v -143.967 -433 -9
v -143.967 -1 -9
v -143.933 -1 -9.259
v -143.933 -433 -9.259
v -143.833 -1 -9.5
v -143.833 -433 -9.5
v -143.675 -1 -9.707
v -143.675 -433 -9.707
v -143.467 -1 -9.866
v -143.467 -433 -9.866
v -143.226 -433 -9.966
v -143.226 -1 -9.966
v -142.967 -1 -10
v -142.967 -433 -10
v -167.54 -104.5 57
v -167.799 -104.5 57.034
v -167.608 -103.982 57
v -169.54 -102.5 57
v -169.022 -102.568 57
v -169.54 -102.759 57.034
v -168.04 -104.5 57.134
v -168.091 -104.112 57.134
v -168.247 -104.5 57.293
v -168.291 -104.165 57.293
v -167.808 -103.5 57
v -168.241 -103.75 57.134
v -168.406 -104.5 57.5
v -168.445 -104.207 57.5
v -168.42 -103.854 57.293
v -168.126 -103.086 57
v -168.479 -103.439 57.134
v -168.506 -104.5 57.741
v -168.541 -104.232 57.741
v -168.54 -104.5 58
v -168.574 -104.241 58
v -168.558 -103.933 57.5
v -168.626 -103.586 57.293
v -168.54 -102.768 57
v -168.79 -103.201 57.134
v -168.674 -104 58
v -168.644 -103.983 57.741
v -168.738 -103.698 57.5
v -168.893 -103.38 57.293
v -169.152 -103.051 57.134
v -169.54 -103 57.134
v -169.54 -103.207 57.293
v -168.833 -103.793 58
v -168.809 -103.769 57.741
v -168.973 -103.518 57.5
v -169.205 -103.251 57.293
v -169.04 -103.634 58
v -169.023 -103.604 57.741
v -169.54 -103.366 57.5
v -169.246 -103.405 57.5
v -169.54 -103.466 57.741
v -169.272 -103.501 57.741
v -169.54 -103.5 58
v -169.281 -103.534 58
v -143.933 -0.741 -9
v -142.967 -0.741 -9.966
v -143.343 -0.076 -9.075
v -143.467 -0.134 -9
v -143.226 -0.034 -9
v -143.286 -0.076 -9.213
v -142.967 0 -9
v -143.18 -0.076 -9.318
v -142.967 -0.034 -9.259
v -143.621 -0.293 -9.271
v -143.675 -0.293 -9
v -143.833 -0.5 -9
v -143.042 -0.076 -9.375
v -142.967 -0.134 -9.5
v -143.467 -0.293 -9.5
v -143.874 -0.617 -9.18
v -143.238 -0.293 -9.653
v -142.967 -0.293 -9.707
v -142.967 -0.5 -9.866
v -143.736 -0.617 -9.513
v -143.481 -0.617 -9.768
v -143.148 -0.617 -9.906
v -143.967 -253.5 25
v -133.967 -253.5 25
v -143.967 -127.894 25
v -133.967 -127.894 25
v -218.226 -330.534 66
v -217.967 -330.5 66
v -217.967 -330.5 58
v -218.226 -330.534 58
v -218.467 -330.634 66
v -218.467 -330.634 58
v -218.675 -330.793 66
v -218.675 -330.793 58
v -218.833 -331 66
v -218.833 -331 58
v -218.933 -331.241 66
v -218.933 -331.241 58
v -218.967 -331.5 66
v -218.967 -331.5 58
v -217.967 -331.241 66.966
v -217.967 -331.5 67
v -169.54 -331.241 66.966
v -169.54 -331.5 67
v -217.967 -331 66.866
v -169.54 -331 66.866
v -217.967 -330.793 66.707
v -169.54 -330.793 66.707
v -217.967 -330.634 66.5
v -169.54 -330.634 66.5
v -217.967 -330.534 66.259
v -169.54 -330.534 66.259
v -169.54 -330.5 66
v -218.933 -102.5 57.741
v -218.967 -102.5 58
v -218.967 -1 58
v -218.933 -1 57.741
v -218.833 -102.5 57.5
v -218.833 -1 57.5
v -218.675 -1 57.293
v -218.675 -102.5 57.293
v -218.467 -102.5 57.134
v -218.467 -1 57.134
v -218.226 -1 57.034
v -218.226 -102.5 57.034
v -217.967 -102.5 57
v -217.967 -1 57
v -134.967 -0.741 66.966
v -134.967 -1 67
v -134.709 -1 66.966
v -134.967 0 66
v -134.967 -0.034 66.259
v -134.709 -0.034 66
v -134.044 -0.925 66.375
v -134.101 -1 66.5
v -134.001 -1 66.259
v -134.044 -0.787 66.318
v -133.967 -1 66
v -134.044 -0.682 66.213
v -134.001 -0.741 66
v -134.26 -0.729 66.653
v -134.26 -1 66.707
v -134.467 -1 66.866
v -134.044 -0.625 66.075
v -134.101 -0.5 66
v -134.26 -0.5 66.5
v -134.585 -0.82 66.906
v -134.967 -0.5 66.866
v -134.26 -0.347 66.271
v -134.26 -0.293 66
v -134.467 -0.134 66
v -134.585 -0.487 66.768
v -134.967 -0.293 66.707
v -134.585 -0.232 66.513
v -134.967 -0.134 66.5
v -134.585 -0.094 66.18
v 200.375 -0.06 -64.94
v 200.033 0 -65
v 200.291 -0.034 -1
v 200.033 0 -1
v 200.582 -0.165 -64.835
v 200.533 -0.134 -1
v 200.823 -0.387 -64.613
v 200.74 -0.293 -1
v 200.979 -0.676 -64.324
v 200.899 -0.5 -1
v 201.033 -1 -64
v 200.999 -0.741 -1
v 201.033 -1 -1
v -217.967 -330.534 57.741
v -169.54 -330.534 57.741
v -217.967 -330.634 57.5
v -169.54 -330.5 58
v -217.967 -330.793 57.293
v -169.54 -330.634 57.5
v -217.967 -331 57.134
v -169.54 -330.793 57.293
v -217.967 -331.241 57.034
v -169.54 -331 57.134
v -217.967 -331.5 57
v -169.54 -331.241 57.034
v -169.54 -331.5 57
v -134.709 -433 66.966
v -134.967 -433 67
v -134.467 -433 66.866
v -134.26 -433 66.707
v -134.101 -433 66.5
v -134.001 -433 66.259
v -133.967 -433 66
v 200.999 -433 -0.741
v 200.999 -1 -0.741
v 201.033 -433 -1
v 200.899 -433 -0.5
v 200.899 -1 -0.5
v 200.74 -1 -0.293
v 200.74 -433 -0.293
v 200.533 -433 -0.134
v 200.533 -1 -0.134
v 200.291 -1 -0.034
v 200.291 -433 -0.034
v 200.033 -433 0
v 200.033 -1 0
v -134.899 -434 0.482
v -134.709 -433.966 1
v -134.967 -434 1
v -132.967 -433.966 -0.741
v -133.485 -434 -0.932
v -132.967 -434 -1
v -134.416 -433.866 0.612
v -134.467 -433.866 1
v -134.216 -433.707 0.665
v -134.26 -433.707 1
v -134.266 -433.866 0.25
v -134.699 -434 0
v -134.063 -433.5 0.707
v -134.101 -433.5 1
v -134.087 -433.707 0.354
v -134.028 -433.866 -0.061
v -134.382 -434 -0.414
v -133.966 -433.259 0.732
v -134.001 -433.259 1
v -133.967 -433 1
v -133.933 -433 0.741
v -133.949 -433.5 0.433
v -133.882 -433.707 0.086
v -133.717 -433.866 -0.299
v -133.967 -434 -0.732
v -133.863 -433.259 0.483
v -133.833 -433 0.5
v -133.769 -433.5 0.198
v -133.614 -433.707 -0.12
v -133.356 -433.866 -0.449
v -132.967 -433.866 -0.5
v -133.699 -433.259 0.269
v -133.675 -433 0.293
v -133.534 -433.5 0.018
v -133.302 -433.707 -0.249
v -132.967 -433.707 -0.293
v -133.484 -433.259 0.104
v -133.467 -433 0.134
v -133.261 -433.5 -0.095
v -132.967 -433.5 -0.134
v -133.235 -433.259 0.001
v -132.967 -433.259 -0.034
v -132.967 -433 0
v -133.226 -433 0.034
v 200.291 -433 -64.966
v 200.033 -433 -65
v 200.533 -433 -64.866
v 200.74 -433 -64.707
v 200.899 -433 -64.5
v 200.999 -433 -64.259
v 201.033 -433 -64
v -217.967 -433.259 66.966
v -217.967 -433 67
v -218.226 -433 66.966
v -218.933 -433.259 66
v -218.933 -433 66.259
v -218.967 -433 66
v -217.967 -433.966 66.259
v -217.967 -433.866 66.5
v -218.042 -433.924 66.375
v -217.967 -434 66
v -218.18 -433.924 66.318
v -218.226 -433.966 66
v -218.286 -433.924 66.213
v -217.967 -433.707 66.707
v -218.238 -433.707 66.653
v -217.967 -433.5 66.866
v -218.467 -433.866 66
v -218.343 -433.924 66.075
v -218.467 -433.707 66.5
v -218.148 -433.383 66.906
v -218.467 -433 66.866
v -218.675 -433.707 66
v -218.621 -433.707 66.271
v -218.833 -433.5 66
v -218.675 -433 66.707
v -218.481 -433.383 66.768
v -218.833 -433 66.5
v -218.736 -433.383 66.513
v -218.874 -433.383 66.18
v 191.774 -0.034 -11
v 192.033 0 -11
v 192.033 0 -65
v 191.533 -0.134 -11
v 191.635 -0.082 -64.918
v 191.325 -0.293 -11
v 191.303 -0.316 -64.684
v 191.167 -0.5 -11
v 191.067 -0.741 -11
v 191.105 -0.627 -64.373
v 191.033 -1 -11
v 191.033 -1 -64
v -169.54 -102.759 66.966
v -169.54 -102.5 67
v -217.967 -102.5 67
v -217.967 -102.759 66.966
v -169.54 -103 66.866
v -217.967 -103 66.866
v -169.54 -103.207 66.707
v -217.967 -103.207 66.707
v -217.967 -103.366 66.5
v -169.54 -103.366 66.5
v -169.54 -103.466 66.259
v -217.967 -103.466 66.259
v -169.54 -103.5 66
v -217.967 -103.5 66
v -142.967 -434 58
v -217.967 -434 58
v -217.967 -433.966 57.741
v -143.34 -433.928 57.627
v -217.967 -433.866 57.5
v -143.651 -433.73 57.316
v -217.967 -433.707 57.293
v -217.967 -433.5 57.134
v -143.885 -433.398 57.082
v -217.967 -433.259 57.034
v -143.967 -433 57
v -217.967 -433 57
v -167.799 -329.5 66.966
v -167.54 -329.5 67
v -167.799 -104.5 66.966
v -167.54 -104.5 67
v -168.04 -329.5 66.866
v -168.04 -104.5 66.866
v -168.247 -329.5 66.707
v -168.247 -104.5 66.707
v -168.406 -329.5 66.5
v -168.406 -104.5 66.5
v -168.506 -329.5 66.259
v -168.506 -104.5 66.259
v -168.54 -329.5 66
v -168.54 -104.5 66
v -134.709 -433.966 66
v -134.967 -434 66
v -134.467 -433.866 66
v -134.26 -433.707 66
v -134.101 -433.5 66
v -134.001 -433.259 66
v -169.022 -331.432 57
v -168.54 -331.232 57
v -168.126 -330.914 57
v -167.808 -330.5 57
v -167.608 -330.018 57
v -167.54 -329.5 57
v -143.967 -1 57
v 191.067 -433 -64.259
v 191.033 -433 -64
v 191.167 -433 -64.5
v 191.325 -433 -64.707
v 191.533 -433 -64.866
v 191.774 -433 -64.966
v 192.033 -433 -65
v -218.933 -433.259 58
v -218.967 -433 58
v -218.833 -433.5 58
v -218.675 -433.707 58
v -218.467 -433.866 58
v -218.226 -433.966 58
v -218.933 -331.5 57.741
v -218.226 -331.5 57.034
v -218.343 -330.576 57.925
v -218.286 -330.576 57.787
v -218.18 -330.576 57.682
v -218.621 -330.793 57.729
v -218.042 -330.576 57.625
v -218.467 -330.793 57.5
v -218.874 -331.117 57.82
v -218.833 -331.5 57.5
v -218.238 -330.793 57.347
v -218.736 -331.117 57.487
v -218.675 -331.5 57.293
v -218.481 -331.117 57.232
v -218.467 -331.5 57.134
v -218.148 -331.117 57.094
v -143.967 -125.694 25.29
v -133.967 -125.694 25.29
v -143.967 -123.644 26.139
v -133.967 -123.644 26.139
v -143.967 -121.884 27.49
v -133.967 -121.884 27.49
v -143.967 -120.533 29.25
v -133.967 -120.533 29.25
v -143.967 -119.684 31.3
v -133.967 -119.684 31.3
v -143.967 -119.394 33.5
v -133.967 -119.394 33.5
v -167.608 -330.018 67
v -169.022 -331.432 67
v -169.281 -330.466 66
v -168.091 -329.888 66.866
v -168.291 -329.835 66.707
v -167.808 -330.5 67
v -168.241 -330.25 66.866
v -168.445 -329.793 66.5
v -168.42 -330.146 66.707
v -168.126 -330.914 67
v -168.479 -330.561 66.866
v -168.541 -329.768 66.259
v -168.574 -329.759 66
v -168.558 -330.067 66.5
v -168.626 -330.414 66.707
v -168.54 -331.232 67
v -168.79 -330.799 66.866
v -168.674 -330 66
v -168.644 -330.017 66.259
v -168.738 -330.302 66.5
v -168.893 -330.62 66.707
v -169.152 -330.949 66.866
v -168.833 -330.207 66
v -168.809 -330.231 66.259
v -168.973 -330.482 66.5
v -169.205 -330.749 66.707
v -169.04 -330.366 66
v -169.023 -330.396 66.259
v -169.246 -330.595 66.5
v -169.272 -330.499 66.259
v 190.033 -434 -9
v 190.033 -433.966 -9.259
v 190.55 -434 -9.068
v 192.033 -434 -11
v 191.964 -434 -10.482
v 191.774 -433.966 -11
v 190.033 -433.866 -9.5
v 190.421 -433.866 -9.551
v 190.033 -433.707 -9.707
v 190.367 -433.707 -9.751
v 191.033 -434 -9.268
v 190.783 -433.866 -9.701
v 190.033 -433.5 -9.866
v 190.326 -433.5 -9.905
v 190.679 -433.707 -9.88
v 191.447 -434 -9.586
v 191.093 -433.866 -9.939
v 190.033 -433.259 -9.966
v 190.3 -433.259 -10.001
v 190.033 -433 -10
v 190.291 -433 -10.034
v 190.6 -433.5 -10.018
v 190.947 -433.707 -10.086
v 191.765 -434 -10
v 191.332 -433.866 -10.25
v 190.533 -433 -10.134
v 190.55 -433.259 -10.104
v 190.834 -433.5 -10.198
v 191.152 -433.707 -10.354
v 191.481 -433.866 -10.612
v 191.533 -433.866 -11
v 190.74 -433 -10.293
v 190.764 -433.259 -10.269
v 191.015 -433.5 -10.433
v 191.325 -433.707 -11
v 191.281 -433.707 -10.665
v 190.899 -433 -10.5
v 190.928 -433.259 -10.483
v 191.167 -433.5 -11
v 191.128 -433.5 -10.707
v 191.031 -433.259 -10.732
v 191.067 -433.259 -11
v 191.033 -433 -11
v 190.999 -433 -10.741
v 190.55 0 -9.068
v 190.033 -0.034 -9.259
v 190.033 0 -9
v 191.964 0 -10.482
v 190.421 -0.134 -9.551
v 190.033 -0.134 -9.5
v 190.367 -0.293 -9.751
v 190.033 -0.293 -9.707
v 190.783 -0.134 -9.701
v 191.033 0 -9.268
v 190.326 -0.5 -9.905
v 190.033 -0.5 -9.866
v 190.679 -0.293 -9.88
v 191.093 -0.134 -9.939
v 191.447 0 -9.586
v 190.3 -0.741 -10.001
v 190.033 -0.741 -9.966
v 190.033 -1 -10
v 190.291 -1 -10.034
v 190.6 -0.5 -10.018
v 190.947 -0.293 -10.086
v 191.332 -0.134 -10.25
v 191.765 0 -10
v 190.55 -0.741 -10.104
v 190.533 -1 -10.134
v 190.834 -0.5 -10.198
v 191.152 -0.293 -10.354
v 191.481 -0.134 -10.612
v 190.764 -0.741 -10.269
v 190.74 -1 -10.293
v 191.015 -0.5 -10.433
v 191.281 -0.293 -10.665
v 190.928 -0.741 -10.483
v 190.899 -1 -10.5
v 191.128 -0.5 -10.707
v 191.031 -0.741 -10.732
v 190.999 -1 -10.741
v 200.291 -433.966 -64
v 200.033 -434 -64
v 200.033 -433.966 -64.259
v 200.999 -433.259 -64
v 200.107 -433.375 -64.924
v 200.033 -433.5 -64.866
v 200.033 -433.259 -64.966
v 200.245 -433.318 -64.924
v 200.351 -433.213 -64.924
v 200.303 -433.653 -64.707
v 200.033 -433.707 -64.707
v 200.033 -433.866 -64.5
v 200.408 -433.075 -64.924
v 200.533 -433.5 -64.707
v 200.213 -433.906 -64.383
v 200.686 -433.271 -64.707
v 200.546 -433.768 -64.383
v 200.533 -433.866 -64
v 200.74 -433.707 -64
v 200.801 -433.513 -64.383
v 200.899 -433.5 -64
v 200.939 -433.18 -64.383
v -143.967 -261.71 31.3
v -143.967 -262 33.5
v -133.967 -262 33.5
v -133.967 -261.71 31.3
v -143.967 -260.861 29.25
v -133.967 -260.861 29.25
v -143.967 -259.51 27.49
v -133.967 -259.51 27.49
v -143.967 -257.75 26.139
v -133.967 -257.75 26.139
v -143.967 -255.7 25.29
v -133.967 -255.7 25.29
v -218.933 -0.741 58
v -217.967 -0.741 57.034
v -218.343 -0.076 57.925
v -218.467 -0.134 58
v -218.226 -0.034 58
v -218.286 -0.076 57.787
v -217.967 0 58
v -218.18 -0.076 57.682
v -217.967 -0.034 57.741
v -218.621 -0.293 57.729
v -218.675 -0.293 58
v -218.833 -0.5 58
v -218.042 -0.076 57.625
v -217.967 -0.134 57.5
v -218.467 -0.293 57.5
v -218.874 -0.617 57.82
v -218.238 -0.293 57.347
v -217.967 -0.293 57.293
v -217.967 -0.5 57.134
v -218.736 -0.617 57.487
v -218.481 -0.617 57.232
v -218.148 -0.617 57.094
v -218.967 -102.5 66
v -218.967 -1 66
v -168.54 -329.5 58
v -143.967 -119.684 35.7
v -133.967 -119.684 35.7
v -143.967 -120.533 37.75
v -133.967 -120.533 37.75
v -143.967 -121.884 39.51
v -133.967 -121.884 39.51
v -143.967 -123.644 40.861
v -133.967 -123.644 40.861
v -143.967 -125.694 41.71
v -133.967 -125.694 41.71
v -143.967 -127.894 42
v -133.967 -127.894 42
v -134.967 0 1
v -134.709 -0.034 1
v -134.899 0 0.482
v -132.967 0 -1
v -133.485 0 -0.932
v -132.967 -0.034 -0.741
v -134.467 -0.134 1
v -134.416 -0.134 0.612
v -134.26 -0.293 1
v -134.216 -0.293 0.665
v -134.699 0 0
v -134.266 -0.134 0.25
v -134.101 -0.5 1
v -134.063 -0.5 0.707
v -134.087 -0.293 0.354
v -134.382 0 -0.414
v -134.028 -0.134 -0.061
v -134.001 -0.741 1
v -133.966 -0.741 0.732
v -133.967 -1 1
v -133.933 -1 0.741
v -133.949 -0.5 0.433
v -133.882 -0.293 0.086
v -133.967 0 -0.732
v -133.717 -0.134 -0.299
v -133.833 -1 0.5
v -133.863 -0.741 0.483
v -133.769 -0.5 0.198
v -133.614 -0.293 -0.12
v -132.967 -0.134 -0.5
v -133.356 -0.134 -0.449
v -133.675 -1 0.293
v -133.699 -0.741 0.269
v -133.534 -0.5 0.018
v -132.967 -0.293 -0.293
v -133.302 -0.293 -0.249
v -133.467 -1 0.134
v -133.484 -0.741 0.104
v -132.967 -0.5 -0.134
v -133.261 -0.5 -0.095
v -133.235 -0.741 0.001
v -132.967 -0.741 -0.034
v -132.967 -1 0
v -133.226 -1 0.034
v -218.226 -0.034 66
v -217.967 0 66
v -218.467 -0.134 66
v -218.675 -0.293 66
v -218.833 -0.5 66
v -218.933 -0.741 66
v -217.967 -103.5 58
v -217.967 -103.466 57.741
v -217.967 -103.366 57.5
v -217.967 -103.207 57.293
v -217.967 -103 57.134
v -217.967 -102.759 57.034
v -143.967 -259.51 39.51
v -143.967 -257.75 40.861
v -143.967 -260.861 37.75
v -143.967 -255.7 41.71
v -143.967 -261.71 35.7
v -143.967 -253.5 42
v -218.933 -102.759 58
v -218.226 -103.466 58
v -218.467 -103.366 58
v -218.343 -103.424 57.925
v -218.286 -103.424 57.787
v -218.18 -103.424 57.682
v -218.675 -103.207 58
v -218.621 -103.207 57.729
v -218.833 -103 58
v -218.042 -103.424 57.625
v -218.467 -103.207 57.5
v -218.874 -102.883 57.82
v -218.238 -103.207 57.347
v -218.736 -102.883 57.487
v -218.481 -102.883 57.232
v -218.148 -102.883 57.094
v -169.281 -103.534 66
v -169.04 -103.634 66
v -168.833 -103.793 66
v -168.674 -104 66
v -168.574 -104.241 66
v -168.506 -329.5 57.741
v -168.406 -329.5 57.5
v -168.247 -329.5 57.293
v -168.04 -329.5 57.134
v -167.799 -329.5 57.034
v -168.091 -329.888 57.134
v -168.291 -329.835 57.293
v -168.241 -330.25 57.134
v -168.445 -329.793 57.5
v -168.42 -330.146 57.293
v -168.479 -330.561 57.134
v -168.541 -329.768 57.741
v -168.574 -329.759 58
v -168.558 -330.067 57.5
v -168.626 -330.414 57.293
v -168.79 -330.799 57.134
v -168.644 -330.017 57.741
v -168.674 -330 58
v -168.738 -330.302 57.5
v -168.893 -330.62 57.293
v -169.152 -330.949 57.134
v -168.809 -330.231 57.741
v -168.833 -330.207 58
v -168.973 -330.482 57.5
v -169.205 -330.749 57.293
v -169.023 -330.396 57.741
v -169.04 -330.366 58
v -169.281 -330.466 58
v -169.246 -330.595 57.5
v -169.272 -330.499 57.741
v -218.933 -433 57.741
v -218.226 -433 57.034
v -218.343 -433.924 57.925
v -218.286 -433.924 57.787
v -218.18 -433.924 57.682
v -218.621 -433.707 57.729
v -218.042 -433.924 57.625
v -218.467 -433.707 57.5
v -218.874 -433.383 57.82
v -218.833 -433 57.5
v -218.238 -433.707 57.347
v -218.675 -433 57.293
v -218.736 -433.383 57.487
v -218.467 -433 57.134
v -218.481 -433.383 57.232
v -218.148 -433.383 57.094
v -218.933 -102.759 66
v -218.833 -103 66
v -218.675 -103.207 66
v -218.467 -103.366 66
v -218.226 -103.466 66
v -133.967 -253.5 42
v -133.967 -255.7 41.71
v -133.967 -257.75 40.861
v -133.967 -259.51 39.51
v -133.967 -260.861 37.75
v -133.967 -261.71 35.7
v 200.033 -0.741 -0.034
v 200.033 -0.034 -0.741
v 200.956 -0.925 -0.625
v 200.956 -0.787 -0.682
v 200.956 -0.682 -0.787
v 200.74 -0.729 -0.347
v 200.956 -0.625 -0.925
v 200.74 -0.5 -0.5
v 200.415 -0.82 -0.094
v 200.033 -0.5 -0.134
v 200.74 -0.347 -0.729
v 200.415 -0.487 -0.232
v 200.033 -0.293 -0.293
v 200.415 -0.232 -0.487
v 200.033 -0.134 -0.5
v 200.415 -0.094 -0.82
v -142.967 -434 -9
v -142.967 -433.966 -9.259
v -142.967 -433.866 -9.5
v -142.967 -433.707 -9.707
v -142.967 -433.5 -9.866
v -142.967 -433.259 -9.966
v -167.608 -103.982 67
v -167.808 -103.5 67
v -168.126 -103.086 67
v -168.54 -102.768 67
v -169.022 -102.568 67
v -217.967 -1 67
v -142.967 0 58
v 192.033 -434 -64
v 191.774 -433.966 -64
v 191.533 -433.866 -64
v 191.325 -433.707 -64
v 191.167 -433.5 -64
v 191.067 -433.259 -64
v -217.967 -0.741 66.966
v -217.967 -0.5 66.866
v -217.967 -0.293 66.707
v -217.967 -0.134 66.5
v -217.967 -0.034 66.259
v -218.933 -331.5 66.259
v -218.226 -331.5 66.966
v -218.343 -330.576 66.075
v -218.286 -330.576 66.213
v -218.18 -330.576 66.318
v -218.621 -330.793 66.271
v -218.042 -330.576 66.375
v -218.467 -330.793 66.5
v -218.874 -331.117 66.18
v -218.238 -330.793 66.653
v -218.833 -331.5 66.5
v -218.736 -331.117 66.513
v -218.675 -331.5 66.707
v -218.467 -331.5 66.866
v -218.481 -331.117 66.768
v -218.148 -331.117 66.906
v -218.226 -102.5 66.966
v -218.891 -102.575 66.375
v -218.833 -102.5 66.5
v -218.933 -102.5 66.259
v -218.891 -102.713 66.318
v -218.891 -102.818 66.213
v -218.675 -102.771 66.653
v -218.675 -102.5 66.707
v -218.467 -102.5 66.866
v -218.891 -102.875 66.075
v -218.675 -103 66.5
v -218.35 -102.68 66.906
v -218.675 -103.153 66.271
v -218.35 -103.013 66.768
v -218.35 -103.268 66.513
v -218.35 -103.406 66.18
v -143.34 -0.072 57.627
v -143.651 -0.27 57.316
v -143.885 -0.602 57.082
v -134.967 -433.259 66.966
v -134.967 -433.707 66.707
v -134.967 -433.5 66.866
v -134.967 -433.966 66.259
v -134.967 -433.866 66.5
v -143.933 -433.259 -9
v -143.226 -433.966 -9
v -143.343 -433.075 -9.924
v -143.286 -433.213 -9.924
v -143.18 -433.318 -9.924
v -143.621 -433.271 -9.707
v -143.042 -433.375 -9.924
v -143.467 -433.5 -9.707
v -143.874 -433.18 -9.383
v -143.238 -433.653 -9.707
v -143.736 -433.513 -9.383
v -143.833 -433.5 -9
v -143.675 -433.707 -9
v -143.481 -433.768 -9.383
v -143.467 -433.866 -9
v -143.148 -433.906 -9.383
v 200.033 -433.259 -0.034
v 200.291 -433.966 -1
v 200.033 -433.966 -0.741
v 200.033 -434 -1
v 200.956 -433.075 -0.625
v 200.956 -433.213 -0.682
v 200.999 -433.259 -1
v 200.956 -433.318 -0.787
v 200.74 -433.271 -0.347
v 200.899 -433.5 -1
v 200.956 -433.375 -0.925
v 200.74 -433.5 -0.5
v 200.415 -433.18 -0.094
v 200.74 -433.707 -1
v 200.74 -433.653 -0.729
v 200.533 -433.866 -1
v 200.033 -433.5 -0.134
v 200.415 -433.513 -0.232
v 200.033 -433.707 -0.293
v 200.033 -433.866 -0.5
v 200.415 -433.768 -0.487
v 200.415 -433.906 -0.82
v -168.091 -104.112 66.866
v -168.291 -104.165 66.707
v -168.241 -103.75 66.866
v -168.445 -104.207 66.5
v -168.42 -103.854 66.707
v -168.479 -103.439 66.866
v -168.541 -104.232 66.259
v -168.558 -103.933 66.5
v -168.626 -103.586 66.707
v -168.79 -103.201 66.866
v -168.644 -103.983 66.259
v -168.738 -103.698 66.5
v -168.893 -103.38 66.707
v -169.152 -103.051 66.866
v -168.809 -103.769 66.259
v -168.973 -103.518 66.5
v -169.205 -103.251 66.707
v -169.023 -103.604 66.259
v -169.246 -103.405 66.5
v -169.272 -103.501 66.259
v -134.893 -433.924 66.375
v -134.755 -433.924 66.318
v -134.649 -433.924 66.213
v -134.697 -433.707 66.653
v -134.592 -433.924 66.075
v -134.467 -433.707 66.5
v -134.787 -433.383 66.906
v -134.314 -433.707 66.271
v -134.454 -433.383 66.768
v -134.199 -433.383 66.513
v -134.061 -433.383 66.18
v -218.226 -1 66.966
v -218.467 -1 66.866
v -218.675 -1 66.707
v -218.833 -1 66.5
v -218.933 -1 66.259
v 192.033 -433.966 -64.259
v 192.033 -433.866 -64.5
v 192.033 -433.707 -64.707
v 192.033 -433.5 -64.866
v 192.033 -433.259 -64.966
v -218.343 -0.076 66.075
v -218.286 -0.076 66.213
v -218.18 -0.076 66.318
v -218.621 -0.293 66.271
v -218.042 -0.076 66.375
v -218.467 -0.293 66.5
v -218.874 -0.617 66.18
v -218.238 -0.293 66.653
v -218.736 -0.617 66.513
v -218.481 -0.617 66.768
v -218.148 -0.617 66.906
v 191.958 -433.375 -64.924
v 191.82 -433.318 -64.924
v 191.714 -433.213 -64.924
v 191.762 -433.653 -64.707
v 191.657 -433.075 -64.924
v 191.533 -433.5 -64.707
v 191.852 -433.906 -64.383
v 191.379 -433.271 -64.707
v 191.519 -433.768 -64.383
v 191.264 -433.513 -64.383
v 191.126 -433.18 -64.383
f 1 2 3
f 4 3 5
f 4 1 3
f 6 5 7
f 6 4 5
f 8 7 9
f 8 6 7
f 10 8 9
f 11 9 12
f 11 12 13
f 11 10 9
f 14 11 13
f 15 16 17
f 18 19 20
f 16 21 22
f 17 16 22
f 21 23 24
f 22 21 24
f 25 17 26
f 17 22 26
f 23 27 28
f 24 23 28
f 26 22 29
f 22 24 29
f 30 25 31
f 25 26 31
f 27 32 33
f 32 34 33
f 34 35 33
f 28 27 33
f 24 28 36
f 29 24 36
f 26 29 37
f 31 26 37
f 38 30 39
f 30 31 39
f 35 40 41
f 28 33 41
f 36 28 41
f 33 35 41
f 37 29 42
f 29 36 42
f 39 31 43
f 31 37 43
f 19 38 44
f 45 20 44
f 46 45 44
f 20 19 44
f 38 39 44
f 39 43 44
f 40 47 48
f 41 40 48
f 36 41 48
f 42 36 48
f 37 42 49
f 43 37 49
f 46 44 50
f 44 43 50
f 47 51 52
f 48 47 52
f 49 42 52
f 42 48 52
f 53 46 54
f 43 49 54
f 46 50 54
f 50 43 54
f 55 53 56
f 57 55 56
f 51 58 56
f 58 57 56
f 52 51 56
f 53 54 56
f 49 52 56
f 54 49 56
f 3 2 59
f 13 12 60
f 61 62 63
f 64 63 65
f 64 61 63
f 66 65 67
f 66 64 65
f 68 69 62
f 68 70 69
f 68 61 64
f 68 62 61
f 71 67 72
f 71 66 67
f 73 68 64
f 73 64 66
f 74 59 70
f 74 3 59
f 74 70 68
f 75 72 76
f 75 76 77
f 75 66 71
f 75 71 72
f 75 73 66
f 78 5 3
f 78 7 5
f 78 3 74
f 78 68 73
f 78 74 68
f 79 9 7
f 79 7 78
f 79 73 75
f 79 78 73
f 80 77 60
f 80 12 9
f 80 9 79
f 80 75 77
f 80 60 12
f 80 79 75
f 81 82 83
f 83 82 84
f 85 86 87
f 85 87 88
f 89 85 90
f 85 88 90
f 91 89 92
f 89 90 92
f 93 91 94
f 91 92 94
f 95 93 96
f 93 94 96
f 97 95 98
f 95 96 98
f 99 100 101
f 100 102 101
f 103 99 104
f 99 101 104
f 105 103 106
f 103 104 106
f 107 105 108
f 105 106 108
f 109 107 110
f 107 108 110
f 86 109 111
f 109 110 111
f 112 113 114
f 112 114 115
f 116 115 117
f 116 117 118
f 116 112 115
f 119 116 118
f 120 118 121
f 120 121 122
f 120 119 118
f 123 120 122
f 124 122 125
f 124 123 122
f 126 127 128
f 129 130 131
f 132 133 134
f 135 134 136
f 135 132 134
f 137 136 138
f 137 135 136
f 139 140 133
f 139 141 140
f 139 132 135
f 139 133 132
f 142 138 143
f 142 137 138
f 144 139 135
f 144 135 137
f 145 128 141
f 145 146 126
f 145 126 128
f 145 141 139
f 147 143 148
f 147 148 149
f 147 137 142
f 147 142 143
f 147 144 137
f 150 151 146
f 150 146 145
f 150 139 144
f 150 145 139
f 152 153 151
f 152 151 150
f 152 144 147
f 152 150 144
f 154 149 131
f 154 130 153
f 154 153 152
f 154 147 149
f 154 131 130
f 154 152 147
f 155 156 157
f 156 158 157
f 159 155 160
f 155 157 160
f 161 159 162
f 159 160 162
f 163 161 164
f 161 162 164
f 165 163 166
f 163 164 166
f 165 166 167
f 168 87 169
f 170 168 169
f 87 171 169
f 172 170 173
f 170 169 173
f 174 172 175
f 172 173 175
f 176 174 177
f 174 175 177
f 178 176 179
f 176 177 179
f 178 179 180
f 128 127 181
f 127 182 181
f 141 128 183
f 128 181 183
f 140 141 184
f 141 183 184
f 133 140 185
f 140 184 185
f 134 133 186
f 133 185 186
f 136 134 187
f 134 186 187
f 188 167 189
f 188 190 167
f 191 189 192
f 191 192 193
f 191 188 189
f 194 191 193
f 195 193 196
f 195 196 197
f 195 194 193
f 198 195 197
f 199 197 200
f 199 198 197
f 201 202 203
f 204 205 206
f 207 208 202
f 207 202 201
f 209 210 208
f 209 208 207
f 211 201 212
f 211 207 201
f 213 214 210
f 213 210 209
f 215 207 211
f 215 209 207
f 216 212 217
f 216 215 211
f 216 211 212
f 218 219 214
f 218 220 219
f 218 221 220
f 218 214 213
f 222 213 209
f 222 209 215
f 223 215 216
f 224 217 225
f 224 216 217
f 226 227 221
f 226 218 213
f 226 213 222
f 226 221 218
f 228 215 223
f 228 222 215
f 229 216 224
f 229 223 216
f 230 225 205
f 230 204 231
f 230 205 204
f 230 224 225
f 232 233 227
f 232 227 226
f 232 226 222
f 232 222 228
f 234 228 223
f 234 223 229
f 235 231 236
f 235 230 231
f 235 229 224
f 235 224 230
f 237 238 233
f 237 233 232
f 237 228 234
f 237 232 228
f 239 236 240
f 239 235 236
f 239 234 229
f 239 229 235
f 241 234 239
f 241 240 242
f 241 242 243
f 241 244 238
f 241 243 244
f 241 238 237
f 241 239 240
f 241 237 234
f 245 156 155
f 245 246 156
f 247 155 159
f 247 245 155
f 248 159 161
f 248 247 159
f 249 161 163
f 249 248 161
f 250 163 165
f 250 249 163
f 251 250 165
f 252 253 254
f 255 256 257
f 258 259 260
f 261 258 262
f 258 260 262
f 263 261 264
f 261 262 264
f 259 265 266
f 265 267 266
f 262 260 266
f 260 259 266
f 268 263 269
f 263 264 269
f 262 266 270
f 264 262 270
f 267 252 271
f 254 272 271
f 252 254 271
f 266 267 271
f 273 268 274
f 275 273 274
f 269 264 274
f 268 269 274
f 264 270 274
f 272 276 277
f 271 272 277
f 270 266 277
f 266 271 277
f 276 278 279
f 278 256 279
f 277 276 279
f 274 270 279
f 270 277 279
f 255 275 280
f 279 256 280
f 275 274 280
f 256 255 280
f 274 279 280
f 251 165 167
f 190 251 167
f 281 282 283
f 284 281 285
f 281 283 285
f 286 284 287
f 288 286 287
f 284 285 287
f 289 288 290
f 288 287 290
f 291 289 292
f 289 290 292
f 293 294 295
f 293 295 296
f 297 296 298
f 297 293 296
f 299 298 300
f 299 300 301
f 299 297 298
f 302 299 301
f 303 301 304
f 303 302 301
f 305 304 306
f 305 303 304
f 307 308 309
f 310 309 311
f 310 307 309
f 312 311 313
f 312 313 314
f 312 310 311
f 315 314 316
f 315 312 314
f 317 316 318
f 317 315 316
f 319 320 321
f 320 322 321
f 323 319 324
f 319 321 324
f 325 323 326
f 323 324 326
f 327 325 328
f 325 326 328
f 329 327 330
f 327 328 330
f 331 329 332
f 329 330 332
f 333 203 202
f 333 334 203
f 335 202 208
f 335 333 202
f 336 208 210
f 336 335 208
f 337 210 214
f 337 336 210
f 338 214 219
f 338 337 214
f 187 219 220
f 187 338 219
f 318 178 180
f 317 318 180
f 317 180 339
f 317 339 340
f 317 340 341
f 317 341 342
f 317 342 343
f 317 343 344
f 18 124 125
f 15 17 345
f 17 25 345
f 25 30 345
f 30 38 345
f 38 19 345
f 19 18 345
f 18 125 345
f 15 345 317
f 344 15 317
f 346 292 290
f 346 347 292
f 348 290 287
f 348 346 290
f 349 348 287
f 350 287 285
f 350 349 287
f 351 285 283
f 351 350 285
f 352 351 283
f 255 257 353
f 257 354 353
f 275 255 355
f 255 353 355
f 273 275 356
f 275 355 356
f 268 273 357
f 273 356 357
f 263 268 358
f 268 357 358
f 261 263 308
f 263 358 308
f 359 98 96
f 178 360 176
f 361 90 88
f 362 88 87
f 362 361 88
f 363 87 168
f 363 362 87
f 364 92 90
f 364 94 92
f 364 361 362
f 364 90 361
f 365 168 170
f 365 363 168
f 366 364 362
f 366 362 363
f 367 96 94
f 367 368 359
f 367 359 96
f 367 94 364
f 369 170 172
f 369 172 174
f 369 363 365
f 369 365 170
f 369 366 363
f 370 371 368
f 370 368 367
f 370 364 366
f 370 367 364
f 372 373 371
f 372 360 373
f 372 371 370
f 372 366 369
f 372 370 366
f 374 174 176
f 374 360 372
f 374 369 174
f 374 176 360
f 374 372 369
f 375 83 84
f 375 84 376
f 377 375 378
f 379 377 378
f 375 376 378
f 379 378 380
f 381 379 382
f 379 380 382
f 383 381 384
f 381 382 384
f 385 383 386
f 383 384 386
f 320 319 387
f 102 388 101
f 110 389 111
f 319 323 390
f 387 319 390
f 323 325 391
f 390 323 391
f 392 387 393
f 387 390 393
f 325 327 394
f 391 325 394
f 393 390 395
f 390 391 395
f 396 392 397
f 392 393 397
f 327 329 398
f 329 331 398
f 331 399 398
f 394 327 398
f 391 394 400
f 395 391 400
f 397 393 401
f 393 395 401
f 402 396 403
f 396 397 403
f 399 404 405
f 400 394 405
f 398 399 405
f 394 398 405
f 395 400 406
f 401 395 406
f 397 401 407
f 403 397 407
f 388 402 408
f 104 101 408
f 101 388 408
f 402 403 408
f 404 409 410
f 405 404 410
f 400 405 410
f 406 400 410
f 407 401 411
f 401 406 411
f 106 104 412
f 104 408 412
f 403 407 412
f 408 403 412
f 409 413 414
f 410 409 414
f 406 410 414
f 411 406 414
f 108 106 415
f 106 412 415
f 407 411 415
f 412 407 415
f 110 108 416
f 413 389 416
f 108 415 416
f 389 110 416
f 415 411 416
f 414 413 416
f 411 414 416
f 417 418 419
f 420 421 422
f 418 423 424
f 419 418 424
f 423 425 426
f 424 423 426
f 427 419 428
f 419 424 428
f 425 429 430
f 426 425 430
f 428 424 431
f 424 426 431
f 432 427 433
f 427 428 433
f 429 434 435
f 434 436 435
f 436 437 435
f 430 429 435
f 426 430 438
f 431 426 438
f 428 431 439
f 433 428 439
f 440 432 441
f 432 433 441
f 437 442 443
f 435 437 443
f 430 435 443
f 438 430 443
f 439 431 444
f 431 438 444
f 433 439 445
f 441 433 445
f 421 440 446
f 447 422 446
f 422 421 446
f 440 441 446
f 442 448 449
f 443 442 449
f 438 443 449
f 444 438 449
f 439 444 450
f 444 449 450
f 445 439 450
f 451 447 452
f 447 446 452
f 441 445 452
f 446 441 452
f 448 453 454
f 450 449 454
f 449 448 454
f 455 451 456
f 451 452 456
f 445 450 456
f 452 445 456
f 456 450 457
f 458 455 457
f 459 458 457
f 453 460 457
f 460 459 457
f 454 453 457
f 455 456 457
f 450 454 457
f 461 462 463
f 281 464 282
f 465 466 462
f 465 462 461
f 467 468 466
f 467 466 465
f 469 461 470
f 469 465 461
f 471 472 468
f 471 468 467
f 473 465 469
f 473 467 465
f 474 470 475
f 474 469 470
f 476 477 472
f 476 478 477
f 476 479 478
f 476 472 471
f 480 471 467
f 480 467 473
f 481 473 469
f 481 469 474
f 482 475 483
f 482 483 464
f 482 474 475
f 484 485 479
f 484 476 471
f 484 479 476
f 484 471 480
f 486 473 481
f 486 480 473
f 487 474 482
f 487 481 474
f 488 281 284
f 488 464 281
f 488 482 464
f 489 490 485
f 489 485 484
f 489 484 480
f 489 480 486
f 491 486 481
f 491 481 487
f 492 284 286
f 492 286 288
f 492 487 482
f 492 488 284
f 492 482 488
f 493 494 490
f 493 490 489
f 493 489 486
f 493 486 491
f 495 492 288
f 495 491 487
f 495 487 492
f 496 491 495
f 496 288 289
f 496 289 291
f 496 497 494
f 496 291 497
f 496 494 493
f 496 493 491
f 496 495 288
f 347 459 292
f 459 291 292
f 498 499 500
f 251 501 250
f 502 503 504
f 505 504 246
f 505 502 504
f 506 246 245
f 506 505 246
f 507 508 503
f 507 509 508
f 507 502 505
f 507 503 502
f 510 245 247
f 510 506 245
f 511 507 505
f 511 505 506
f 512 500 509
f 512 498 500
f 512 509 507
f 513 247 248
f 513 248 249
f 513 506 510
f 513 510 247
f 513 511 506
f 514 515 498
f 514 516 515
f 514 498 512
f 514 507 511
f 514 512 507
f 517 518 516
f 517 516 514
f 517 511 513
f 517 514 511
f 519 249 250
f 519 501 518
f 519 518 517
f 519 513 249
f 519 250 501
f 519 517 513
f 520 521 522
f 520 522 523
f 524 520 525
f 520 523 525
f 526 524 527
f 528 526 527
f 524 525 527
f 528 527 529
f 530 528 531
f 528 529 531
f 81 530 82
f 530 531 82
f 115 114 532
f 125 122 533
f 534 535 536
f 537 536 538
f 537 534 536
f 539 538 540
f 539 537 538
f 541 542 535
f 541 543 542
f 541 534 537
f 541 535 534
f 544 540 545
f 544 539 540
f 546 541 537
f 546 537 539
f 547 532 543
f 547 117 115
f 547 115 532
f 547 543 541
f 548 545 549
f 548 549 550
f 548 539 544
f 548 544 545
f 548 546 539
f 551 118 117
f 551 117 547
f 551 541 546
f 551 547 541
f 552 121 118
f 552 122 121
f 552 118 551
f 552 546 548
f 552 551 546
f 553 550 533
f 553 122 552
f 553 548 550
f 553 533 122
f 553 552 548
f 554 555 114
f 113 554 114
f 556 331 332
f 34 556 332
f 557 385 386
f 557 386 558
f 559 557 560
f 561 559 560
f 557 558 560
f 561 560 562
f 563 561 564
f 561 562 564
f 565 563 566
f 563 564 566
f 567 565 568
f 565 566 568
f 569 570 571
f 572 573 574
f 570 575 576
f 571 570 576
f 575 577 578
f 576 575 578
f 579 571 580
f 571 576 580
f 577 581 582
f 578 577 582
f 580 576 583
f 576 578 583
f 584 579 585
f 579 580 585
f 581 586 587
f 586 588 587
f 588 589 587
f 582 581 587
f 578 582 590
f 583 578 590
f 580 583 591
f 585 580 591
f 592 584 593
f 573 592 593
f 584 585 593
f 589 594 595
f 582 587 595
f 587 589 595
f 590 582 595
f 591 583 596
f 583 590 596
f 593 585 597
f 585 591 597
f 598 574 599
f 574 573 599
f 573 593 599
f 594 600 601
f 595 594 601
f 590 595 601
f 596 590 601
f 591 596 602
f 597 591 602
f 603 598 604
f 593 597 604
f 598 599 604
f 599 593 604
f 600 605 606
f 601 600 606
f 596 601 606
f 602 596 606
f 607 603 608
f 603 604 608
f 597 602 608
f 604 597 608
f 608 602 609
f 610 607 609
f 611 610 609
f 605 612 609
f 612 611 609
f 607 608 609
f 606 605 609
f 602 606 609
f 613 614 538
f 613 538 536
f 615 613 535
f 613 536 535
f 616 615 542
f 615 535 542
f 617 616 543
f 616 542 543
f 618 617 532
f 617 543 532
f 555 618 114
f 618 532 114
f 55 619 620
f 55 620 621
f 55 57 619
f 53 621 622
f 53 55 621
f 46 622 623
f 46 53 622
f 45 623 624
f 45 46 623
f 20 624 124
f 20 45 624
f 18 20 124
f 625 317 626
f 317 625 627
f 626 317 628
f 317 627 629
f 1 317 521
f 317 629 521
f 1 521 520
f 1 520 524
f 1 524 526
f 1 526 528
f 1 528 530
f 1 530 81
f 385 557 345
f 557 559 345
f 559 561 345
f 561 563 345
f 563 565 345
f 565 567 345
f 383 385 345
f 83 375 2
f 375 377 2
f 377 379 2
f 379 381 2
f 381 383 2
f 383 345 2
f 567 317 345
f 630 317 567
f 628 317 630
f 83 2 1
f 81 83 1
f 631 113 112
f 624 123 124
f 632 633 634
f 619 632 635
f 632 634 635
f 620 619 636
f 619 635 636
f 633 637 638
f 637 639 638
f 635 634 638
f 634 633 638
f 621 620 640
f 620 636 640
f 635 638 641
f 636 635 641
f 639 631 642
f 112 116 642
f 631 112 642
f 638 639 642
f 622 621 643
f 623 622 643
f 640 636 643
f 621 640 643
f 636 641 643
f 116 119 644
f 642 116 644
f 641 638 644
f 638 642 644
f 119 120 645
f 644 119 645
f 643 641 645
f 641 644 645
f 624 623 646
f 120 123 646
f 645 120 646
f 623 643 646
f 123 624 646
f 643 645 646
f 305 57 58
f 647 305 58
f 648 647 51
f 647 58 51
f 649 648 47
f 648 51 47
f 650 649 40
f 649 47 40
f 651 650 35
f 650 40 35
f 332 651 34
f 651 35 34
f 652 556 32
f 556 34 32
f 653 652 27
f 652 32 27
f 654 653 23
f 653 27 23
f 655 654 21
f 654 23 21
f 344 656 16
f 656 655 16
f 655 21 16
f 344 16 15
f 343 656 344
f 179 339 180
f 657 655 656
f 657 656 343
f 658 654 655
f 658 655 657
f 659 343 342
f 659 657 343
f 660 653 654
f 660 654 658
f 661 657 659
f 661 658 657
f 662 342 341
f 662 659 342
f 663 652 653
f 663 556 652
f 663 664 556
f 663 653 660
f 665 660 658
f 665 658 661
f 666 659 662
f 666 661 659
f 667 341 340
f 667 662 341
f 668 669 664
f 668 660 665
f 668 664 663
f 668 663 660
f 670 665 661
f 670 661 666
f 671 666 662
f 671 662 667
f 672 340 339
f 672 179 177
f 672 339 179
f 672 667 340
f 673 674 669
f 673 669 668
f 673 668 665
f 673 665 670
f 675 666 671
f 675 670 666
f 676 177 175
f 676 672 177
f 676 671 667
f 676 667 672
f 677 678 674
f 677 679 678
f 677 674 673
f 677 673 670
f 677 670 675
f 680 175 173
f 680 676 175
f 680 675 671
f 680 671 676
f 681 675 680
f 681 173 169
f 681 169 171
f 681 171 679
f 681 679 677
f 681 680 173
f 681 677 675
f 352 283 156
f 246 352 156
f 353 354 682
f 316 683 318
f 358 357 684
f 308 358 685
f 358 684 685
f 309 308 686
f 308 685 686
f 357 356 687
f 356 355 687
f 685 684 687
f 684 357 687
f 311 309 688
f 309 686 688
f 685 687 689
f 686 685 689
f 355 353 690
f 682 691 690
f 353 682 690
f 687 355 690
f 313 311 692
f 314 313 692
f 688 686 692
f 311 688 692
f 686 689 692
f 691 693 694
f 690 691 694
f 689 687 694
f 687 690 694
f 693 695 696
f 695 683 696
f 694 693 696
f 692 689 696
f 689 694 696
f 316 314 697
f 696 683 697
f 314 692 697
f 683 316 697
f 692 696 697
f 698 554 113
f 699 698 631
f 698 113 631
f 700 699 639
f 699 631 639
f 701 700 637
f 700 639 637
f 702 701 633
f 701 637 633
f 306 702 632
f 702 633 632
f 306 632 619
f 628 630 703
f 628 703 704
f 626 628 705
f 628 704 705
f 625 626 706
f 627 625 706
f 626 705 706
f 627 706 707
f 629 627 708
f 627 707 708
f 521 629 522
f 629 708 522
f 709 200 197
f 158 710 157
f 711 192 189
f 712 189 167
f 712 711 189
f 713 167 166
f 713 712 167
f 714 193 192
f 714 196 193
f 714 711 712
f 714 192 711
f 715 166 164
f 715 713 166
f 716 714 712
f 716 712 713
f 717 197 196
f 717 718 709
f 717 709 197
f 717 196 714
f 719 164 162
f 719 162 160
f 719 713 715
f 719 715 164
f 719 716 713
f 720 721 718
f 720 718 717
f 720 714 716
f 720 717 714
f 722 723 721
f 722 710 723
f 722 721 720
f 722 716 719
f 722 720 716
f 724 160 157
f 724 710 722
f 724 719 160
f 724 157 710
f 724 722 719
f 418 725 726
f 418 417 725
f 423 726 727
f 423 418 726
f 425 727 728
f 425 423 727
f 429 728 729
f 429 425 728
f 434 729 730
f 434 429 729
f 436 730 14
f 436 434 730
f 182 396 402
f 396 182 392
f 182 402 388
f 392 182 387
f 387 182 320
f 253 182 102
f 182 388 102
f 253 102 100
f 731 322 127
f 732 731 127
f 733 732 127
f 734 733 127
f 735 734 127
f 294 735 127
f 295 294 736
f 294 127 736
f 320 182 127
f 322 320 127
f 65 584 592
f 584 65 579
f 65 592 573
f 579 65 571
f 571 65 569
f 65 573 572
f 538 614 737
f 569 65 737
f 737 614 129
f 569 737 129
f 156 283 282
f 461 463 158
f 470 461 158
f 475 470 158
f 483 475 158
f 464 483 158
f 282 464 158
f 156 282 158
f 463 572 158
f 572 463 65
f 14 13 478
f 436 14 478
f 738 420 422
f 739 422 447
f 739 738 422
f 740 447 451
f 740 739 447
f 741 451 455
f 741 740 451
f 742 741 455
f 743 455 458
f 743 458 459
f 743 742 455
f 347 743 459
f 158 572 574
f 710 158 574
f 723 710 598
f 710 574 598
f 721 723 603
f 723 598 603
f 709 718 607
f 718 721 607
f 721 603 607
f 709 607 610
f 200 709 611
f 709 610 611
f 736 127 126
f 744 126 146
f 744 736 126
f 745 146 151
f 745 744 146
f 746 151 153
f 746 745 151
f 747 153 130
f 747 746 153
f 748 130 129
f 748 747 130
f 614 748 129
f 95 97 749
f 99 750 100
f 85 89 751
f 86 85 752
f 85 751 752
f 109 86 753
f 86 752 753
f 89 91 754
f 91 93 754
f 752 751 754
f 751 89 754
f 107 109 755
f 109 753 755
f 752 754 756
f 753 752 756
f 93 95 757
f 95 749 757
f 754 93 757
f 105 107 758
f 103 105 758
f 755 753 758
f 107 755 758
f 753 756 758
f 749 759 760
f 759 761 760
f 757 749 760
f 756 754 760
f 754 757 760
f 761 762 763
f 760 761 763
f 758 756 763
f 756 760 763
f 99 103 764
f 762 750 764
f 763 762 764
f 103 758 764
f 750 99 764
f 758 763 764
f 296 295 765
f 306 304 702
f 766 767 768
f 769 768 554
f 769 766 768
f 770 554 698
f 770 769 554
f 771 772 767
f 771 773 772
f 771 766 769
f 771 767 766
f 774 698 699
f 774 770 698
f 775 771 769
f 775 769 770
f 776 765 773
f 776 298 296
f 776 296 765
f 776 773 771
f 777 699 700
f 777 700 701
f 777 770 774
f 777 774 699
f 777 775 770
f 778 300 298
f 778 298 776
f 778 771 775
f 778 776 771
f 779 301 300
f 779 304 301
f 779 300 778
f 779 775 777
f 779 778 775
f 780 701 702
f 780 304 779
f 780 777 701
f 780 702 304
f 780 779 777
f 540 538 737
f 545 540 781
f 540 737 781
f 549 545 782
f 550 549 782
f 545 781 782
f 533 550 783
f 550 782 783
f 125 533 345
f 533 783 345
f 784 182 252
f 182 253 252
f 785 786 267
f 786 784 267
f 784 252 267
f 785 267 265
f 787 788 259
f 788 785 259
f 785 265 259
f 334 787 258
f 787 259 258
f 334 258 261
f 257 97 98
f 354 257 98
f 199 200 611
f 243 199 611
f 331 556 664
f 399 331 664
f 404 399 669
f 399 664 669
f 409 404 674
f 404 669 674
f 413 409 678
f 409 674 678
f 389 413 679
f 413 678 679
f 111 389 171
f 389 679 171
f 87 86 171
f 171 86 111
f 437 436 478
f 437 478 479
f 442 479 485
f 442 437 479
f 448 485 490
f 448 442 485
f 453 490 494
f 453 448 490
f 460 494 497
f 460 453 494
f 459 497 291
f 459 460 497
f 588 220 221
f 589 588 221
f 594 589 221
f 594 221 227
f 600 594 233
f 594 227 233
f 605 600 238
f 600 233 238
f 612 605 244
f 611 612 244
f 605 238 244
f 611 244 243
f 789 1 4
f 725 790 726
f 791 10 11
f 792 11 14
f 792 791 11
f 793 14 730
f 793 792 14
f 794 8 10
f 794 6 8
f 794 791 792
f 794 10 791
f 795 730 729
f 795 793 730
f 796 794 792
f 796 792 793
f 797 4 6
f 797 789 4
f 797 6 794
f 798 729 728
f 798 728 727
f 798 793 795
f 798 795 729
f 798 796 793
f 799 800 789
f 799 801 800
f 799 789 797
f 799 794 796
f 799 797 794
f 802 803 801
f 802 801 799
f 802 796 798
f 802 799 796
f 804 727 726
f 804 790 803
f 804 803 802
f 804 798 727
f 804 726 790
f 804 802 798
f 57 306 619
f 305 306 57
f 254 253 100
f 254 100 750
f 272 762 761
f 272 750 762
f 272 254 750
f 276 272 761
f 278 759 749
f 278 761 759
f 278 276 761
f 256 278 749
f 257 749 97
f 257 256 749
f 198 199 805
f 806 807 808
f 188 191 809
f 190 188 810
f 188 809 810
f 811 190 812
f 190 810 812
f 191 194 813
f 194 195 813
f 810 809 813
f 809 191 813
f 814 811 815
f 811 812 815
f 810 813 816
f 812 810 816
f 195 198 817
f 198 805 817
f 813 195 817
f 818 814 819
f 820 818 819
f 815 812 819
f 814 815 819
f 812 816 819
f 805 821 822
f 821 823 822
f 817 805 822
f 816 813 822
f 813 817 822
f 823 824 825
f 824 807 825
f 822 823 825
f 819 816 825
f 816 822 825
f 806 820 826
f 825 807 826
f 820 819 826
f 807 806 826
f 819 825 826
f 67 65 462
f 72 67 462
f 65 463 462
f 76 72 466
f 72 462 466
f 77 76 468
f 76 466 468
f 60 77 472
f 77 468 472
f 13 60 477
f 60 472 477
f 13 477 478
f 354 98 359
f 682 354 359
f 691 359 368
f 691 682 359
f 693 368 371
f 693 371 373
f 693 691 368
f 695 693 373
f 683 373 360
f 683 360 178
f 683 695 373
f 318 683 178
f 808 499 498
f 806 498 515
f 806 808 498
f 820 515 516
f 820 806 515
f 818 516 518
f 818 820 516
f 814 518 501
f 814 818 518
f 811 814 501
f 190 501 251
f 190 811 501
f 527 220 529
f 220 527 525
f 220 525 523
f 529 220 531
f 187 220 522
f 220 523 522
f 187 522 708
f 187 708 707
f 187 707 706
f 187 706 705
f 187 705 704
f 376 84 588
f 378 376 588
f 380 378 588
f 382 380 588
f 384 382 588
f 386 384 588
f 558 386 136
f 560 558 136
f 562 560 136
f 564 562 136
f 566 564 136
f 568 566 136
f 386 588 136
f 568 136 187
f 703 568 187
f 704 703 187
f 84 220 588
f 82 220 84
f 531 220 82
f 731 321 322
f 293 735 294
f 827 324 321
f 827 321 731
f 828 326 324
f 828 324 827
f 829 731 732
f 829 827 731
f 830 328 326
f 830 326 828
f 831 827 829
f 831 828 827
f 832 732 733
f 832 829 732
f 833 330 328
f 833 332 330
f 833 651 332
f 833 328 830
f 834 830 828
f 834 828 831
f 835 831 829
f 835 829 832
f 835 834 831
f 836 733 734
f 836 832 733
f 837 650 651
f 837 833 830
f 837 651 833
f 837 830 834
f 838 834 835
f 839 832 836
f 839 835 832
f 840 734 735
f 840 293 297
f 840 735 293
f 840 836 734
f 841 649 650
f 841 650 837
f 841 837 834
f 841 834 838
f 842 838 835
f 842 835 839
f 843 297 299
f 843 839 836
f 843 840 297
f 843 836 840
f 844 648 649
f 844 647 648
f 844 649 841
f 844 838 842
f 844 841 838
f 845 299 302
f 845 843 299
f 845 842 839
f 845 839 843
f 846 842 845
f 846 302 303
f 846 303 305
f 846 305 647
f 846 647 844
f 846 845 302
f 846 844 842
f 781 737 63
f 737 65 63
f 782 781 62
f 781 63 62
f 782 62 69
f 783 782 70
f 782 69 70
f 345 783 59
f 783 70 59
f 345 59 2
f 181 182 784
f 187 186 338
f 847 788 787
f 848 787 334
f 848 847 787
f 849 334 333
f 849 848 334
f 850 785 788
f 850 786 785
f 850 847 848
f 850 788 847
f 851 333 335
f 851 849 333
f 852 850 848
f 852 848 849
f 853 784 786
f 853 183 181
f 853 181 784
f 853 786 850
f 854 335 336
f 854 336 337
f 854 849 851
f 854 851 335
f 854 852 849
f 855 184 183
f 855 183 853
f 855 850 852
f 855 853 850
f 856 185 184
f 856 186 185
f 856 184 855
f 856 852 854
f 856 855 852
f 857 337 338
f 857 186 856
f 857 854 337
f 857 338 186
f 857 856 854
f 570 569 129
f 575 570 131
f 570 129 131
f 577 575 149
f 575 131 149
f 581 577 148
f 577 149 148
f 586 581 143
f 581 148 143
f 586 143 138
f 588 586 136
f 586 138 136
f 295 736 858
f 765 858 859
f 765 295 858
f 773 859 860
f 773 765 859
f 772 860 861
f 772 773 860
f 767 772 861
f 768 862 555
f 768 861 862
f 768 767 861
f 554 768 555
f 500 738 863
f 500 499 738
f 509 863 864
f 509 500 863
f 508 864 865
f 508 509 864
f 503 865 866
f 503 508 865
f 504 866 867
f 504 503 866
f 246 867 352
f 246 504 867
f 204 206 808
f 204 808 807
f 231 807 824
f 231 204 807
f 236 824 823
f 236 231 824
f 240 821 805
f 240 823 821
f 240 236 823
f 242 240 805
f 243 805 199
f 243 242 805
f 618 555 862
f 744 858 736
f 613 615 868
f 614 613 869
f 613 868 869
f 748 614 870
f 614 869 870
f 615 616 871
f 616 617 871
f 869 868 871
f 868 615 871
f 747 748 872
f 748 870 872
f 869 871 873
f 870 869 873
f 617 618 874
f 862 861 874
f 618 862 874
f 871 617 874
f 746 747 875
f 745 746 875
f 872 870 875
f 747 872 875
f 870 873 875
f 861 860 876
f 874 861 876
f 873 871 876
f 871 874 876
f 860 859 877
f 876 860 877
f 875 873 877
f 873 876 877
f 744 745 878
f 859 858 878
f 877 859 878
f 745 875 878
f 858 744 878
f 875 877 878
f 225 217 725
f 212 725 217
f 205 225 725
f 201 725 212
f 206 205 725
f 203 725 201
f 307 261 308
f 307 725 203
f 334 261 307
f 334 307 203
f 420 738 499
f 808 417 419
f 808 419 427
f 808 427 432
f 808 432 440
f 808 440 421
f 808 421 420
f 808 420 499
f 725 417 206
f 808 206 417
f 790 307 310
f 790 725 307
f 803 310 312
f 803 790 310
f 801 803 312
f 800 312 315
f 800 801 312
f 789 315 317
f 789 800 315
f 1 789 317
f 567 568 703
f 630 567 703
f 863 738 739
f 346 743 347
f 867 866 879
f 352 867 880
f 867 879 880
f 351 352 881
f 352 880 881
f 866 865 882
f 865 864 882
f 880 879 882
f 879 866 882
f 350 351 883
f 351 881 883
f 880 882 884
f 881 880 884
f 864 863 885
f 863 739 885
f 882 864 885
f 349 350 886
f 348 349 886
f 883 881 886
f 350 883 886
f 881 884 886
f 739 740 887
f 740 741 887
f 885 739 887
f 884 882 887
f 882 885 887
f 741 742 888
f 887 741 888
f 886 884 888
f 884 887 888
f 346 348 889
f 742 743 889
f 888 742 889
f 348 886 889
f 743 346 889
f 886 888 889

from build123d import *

# Parameters (mm, degrees)
F1_DEPTH = 434
F2_W     = 50.4274696951
F2_H     = 227
F3_DEPTH = 132.001
F5_DEPTH = 25.4
F6_R     = 1


with BuildPart() as f1:
    # F0 (on Front) → F1 (new body)
    with BuildSketch(Plane.XZ):
        Polygon((-133.9674020287, 67), (-218.9674020287, 67), (-218.9674020287, 57), (-143.9674020287, 57), (-143.9674020287, -10), (191.0325979713, -10), (191.0325979713, -65), (201.0325979713, -65), (201.0325979713, 0), (-133.9674020287, 0), align=None)
    extrude(amount=F1_DEPTH)

    # F2 (on face) → F3 (cut, through all)
    with BuildSketch(Plane.XY.offset(67)):
        with Locations((-193.7536671811, -217)):
            Rectangle(F2_W, F2_H)
    extrude(amount=-F3_DEPTH, mode=Mode.SUBTRACT)

    # F4 (on face) → F5 (cut)
    with BuildSketch(Plane.YZ.offset(-133.9674020287)):
        with BuildLine():
            Line((-127.8944141269, 42), (-253.5, 42))
            ThreePointArc((-253.5, 42), (-259.5104076401, 39.5104076401), (-262, 33.5))
            ThreePointArc((-262, 33.5), (-259.5104076401, 27.4895923599), (-253.5, 25))
            Line((-253.5, 25), (-127.8944141269, 25))
            ThreePointArc((-127.8944141269, 25), (-121.8840064868, 27.4895923599), (-119.3944141269, 33.5))
            ThreePointArc((-119.3944141269, 33.5), (-121.8840064868, 39.5104076401), (-127.8944141269, 42))
        make_face()
    extrude(amount=-F5_DEPTH, mode=Mode.SUBTRACT)

    # F6
    f6_edges = [f1.edges().sort_by_distance(p)[0] for p in [
        (-193.753667, -103.5, 67),
        (-168.539932, -103.5, 62),
        (-168.539932, -217, 57),
        (-168.539932, -217, 67),
        (-218.967402, -51.75, 67),
        (-218.967402, -51.75, 57),
        (-218.967402, -103.5, 62),
        (-218.967402, 0, 62),
        (-176.467402, 0, 67),
        (-133.967402, -217, 67),
        (-218.967402, -382.25, 67),
        (-218.967402, -382.25, 57),
        (-218.967402, -330.5, 62),
        (-193.753667, -330.5, 57),
        (-193.753667, -330.5, 67),
        (-168.539932, -330.5, 62),
        (-176.467402, -434, 67),
        (-218.967402, -434, 62),
        (-181.467402, -434, 57),
        (-143.967402, -434, 23.5),
        (-133.967402, -434, 33.5),
        (-143.967402, -217, -10),
        (-143.967402, 0, 23.5),
        (-133.967402, 0, 33.5),
        (33.532598, 0, 0),
        (23.532598, 0, -10),
        (-181.467402, 0, 57),
        (33.532598, -434, 0),
        (23.532598, -434, -10),
        (-133.967402, -217, 0),
        (201.032598, -217, 0),
        (201.032598, -434, -32.5),
        (191.032598, -434, -37.5),
        (196.032598, -434, -65),
        (201.032598, -217, -65),
        (191.032598, -217, -65),
        (201.032598, 0, -32.5),
        (191.032598, 0, -37.5),
        (191.032598, -217, -10),
        (-193.753667, -103.5, 57),
    ]]
    fillet(f6_edges, radius=F6_R)


solid = f1.part
